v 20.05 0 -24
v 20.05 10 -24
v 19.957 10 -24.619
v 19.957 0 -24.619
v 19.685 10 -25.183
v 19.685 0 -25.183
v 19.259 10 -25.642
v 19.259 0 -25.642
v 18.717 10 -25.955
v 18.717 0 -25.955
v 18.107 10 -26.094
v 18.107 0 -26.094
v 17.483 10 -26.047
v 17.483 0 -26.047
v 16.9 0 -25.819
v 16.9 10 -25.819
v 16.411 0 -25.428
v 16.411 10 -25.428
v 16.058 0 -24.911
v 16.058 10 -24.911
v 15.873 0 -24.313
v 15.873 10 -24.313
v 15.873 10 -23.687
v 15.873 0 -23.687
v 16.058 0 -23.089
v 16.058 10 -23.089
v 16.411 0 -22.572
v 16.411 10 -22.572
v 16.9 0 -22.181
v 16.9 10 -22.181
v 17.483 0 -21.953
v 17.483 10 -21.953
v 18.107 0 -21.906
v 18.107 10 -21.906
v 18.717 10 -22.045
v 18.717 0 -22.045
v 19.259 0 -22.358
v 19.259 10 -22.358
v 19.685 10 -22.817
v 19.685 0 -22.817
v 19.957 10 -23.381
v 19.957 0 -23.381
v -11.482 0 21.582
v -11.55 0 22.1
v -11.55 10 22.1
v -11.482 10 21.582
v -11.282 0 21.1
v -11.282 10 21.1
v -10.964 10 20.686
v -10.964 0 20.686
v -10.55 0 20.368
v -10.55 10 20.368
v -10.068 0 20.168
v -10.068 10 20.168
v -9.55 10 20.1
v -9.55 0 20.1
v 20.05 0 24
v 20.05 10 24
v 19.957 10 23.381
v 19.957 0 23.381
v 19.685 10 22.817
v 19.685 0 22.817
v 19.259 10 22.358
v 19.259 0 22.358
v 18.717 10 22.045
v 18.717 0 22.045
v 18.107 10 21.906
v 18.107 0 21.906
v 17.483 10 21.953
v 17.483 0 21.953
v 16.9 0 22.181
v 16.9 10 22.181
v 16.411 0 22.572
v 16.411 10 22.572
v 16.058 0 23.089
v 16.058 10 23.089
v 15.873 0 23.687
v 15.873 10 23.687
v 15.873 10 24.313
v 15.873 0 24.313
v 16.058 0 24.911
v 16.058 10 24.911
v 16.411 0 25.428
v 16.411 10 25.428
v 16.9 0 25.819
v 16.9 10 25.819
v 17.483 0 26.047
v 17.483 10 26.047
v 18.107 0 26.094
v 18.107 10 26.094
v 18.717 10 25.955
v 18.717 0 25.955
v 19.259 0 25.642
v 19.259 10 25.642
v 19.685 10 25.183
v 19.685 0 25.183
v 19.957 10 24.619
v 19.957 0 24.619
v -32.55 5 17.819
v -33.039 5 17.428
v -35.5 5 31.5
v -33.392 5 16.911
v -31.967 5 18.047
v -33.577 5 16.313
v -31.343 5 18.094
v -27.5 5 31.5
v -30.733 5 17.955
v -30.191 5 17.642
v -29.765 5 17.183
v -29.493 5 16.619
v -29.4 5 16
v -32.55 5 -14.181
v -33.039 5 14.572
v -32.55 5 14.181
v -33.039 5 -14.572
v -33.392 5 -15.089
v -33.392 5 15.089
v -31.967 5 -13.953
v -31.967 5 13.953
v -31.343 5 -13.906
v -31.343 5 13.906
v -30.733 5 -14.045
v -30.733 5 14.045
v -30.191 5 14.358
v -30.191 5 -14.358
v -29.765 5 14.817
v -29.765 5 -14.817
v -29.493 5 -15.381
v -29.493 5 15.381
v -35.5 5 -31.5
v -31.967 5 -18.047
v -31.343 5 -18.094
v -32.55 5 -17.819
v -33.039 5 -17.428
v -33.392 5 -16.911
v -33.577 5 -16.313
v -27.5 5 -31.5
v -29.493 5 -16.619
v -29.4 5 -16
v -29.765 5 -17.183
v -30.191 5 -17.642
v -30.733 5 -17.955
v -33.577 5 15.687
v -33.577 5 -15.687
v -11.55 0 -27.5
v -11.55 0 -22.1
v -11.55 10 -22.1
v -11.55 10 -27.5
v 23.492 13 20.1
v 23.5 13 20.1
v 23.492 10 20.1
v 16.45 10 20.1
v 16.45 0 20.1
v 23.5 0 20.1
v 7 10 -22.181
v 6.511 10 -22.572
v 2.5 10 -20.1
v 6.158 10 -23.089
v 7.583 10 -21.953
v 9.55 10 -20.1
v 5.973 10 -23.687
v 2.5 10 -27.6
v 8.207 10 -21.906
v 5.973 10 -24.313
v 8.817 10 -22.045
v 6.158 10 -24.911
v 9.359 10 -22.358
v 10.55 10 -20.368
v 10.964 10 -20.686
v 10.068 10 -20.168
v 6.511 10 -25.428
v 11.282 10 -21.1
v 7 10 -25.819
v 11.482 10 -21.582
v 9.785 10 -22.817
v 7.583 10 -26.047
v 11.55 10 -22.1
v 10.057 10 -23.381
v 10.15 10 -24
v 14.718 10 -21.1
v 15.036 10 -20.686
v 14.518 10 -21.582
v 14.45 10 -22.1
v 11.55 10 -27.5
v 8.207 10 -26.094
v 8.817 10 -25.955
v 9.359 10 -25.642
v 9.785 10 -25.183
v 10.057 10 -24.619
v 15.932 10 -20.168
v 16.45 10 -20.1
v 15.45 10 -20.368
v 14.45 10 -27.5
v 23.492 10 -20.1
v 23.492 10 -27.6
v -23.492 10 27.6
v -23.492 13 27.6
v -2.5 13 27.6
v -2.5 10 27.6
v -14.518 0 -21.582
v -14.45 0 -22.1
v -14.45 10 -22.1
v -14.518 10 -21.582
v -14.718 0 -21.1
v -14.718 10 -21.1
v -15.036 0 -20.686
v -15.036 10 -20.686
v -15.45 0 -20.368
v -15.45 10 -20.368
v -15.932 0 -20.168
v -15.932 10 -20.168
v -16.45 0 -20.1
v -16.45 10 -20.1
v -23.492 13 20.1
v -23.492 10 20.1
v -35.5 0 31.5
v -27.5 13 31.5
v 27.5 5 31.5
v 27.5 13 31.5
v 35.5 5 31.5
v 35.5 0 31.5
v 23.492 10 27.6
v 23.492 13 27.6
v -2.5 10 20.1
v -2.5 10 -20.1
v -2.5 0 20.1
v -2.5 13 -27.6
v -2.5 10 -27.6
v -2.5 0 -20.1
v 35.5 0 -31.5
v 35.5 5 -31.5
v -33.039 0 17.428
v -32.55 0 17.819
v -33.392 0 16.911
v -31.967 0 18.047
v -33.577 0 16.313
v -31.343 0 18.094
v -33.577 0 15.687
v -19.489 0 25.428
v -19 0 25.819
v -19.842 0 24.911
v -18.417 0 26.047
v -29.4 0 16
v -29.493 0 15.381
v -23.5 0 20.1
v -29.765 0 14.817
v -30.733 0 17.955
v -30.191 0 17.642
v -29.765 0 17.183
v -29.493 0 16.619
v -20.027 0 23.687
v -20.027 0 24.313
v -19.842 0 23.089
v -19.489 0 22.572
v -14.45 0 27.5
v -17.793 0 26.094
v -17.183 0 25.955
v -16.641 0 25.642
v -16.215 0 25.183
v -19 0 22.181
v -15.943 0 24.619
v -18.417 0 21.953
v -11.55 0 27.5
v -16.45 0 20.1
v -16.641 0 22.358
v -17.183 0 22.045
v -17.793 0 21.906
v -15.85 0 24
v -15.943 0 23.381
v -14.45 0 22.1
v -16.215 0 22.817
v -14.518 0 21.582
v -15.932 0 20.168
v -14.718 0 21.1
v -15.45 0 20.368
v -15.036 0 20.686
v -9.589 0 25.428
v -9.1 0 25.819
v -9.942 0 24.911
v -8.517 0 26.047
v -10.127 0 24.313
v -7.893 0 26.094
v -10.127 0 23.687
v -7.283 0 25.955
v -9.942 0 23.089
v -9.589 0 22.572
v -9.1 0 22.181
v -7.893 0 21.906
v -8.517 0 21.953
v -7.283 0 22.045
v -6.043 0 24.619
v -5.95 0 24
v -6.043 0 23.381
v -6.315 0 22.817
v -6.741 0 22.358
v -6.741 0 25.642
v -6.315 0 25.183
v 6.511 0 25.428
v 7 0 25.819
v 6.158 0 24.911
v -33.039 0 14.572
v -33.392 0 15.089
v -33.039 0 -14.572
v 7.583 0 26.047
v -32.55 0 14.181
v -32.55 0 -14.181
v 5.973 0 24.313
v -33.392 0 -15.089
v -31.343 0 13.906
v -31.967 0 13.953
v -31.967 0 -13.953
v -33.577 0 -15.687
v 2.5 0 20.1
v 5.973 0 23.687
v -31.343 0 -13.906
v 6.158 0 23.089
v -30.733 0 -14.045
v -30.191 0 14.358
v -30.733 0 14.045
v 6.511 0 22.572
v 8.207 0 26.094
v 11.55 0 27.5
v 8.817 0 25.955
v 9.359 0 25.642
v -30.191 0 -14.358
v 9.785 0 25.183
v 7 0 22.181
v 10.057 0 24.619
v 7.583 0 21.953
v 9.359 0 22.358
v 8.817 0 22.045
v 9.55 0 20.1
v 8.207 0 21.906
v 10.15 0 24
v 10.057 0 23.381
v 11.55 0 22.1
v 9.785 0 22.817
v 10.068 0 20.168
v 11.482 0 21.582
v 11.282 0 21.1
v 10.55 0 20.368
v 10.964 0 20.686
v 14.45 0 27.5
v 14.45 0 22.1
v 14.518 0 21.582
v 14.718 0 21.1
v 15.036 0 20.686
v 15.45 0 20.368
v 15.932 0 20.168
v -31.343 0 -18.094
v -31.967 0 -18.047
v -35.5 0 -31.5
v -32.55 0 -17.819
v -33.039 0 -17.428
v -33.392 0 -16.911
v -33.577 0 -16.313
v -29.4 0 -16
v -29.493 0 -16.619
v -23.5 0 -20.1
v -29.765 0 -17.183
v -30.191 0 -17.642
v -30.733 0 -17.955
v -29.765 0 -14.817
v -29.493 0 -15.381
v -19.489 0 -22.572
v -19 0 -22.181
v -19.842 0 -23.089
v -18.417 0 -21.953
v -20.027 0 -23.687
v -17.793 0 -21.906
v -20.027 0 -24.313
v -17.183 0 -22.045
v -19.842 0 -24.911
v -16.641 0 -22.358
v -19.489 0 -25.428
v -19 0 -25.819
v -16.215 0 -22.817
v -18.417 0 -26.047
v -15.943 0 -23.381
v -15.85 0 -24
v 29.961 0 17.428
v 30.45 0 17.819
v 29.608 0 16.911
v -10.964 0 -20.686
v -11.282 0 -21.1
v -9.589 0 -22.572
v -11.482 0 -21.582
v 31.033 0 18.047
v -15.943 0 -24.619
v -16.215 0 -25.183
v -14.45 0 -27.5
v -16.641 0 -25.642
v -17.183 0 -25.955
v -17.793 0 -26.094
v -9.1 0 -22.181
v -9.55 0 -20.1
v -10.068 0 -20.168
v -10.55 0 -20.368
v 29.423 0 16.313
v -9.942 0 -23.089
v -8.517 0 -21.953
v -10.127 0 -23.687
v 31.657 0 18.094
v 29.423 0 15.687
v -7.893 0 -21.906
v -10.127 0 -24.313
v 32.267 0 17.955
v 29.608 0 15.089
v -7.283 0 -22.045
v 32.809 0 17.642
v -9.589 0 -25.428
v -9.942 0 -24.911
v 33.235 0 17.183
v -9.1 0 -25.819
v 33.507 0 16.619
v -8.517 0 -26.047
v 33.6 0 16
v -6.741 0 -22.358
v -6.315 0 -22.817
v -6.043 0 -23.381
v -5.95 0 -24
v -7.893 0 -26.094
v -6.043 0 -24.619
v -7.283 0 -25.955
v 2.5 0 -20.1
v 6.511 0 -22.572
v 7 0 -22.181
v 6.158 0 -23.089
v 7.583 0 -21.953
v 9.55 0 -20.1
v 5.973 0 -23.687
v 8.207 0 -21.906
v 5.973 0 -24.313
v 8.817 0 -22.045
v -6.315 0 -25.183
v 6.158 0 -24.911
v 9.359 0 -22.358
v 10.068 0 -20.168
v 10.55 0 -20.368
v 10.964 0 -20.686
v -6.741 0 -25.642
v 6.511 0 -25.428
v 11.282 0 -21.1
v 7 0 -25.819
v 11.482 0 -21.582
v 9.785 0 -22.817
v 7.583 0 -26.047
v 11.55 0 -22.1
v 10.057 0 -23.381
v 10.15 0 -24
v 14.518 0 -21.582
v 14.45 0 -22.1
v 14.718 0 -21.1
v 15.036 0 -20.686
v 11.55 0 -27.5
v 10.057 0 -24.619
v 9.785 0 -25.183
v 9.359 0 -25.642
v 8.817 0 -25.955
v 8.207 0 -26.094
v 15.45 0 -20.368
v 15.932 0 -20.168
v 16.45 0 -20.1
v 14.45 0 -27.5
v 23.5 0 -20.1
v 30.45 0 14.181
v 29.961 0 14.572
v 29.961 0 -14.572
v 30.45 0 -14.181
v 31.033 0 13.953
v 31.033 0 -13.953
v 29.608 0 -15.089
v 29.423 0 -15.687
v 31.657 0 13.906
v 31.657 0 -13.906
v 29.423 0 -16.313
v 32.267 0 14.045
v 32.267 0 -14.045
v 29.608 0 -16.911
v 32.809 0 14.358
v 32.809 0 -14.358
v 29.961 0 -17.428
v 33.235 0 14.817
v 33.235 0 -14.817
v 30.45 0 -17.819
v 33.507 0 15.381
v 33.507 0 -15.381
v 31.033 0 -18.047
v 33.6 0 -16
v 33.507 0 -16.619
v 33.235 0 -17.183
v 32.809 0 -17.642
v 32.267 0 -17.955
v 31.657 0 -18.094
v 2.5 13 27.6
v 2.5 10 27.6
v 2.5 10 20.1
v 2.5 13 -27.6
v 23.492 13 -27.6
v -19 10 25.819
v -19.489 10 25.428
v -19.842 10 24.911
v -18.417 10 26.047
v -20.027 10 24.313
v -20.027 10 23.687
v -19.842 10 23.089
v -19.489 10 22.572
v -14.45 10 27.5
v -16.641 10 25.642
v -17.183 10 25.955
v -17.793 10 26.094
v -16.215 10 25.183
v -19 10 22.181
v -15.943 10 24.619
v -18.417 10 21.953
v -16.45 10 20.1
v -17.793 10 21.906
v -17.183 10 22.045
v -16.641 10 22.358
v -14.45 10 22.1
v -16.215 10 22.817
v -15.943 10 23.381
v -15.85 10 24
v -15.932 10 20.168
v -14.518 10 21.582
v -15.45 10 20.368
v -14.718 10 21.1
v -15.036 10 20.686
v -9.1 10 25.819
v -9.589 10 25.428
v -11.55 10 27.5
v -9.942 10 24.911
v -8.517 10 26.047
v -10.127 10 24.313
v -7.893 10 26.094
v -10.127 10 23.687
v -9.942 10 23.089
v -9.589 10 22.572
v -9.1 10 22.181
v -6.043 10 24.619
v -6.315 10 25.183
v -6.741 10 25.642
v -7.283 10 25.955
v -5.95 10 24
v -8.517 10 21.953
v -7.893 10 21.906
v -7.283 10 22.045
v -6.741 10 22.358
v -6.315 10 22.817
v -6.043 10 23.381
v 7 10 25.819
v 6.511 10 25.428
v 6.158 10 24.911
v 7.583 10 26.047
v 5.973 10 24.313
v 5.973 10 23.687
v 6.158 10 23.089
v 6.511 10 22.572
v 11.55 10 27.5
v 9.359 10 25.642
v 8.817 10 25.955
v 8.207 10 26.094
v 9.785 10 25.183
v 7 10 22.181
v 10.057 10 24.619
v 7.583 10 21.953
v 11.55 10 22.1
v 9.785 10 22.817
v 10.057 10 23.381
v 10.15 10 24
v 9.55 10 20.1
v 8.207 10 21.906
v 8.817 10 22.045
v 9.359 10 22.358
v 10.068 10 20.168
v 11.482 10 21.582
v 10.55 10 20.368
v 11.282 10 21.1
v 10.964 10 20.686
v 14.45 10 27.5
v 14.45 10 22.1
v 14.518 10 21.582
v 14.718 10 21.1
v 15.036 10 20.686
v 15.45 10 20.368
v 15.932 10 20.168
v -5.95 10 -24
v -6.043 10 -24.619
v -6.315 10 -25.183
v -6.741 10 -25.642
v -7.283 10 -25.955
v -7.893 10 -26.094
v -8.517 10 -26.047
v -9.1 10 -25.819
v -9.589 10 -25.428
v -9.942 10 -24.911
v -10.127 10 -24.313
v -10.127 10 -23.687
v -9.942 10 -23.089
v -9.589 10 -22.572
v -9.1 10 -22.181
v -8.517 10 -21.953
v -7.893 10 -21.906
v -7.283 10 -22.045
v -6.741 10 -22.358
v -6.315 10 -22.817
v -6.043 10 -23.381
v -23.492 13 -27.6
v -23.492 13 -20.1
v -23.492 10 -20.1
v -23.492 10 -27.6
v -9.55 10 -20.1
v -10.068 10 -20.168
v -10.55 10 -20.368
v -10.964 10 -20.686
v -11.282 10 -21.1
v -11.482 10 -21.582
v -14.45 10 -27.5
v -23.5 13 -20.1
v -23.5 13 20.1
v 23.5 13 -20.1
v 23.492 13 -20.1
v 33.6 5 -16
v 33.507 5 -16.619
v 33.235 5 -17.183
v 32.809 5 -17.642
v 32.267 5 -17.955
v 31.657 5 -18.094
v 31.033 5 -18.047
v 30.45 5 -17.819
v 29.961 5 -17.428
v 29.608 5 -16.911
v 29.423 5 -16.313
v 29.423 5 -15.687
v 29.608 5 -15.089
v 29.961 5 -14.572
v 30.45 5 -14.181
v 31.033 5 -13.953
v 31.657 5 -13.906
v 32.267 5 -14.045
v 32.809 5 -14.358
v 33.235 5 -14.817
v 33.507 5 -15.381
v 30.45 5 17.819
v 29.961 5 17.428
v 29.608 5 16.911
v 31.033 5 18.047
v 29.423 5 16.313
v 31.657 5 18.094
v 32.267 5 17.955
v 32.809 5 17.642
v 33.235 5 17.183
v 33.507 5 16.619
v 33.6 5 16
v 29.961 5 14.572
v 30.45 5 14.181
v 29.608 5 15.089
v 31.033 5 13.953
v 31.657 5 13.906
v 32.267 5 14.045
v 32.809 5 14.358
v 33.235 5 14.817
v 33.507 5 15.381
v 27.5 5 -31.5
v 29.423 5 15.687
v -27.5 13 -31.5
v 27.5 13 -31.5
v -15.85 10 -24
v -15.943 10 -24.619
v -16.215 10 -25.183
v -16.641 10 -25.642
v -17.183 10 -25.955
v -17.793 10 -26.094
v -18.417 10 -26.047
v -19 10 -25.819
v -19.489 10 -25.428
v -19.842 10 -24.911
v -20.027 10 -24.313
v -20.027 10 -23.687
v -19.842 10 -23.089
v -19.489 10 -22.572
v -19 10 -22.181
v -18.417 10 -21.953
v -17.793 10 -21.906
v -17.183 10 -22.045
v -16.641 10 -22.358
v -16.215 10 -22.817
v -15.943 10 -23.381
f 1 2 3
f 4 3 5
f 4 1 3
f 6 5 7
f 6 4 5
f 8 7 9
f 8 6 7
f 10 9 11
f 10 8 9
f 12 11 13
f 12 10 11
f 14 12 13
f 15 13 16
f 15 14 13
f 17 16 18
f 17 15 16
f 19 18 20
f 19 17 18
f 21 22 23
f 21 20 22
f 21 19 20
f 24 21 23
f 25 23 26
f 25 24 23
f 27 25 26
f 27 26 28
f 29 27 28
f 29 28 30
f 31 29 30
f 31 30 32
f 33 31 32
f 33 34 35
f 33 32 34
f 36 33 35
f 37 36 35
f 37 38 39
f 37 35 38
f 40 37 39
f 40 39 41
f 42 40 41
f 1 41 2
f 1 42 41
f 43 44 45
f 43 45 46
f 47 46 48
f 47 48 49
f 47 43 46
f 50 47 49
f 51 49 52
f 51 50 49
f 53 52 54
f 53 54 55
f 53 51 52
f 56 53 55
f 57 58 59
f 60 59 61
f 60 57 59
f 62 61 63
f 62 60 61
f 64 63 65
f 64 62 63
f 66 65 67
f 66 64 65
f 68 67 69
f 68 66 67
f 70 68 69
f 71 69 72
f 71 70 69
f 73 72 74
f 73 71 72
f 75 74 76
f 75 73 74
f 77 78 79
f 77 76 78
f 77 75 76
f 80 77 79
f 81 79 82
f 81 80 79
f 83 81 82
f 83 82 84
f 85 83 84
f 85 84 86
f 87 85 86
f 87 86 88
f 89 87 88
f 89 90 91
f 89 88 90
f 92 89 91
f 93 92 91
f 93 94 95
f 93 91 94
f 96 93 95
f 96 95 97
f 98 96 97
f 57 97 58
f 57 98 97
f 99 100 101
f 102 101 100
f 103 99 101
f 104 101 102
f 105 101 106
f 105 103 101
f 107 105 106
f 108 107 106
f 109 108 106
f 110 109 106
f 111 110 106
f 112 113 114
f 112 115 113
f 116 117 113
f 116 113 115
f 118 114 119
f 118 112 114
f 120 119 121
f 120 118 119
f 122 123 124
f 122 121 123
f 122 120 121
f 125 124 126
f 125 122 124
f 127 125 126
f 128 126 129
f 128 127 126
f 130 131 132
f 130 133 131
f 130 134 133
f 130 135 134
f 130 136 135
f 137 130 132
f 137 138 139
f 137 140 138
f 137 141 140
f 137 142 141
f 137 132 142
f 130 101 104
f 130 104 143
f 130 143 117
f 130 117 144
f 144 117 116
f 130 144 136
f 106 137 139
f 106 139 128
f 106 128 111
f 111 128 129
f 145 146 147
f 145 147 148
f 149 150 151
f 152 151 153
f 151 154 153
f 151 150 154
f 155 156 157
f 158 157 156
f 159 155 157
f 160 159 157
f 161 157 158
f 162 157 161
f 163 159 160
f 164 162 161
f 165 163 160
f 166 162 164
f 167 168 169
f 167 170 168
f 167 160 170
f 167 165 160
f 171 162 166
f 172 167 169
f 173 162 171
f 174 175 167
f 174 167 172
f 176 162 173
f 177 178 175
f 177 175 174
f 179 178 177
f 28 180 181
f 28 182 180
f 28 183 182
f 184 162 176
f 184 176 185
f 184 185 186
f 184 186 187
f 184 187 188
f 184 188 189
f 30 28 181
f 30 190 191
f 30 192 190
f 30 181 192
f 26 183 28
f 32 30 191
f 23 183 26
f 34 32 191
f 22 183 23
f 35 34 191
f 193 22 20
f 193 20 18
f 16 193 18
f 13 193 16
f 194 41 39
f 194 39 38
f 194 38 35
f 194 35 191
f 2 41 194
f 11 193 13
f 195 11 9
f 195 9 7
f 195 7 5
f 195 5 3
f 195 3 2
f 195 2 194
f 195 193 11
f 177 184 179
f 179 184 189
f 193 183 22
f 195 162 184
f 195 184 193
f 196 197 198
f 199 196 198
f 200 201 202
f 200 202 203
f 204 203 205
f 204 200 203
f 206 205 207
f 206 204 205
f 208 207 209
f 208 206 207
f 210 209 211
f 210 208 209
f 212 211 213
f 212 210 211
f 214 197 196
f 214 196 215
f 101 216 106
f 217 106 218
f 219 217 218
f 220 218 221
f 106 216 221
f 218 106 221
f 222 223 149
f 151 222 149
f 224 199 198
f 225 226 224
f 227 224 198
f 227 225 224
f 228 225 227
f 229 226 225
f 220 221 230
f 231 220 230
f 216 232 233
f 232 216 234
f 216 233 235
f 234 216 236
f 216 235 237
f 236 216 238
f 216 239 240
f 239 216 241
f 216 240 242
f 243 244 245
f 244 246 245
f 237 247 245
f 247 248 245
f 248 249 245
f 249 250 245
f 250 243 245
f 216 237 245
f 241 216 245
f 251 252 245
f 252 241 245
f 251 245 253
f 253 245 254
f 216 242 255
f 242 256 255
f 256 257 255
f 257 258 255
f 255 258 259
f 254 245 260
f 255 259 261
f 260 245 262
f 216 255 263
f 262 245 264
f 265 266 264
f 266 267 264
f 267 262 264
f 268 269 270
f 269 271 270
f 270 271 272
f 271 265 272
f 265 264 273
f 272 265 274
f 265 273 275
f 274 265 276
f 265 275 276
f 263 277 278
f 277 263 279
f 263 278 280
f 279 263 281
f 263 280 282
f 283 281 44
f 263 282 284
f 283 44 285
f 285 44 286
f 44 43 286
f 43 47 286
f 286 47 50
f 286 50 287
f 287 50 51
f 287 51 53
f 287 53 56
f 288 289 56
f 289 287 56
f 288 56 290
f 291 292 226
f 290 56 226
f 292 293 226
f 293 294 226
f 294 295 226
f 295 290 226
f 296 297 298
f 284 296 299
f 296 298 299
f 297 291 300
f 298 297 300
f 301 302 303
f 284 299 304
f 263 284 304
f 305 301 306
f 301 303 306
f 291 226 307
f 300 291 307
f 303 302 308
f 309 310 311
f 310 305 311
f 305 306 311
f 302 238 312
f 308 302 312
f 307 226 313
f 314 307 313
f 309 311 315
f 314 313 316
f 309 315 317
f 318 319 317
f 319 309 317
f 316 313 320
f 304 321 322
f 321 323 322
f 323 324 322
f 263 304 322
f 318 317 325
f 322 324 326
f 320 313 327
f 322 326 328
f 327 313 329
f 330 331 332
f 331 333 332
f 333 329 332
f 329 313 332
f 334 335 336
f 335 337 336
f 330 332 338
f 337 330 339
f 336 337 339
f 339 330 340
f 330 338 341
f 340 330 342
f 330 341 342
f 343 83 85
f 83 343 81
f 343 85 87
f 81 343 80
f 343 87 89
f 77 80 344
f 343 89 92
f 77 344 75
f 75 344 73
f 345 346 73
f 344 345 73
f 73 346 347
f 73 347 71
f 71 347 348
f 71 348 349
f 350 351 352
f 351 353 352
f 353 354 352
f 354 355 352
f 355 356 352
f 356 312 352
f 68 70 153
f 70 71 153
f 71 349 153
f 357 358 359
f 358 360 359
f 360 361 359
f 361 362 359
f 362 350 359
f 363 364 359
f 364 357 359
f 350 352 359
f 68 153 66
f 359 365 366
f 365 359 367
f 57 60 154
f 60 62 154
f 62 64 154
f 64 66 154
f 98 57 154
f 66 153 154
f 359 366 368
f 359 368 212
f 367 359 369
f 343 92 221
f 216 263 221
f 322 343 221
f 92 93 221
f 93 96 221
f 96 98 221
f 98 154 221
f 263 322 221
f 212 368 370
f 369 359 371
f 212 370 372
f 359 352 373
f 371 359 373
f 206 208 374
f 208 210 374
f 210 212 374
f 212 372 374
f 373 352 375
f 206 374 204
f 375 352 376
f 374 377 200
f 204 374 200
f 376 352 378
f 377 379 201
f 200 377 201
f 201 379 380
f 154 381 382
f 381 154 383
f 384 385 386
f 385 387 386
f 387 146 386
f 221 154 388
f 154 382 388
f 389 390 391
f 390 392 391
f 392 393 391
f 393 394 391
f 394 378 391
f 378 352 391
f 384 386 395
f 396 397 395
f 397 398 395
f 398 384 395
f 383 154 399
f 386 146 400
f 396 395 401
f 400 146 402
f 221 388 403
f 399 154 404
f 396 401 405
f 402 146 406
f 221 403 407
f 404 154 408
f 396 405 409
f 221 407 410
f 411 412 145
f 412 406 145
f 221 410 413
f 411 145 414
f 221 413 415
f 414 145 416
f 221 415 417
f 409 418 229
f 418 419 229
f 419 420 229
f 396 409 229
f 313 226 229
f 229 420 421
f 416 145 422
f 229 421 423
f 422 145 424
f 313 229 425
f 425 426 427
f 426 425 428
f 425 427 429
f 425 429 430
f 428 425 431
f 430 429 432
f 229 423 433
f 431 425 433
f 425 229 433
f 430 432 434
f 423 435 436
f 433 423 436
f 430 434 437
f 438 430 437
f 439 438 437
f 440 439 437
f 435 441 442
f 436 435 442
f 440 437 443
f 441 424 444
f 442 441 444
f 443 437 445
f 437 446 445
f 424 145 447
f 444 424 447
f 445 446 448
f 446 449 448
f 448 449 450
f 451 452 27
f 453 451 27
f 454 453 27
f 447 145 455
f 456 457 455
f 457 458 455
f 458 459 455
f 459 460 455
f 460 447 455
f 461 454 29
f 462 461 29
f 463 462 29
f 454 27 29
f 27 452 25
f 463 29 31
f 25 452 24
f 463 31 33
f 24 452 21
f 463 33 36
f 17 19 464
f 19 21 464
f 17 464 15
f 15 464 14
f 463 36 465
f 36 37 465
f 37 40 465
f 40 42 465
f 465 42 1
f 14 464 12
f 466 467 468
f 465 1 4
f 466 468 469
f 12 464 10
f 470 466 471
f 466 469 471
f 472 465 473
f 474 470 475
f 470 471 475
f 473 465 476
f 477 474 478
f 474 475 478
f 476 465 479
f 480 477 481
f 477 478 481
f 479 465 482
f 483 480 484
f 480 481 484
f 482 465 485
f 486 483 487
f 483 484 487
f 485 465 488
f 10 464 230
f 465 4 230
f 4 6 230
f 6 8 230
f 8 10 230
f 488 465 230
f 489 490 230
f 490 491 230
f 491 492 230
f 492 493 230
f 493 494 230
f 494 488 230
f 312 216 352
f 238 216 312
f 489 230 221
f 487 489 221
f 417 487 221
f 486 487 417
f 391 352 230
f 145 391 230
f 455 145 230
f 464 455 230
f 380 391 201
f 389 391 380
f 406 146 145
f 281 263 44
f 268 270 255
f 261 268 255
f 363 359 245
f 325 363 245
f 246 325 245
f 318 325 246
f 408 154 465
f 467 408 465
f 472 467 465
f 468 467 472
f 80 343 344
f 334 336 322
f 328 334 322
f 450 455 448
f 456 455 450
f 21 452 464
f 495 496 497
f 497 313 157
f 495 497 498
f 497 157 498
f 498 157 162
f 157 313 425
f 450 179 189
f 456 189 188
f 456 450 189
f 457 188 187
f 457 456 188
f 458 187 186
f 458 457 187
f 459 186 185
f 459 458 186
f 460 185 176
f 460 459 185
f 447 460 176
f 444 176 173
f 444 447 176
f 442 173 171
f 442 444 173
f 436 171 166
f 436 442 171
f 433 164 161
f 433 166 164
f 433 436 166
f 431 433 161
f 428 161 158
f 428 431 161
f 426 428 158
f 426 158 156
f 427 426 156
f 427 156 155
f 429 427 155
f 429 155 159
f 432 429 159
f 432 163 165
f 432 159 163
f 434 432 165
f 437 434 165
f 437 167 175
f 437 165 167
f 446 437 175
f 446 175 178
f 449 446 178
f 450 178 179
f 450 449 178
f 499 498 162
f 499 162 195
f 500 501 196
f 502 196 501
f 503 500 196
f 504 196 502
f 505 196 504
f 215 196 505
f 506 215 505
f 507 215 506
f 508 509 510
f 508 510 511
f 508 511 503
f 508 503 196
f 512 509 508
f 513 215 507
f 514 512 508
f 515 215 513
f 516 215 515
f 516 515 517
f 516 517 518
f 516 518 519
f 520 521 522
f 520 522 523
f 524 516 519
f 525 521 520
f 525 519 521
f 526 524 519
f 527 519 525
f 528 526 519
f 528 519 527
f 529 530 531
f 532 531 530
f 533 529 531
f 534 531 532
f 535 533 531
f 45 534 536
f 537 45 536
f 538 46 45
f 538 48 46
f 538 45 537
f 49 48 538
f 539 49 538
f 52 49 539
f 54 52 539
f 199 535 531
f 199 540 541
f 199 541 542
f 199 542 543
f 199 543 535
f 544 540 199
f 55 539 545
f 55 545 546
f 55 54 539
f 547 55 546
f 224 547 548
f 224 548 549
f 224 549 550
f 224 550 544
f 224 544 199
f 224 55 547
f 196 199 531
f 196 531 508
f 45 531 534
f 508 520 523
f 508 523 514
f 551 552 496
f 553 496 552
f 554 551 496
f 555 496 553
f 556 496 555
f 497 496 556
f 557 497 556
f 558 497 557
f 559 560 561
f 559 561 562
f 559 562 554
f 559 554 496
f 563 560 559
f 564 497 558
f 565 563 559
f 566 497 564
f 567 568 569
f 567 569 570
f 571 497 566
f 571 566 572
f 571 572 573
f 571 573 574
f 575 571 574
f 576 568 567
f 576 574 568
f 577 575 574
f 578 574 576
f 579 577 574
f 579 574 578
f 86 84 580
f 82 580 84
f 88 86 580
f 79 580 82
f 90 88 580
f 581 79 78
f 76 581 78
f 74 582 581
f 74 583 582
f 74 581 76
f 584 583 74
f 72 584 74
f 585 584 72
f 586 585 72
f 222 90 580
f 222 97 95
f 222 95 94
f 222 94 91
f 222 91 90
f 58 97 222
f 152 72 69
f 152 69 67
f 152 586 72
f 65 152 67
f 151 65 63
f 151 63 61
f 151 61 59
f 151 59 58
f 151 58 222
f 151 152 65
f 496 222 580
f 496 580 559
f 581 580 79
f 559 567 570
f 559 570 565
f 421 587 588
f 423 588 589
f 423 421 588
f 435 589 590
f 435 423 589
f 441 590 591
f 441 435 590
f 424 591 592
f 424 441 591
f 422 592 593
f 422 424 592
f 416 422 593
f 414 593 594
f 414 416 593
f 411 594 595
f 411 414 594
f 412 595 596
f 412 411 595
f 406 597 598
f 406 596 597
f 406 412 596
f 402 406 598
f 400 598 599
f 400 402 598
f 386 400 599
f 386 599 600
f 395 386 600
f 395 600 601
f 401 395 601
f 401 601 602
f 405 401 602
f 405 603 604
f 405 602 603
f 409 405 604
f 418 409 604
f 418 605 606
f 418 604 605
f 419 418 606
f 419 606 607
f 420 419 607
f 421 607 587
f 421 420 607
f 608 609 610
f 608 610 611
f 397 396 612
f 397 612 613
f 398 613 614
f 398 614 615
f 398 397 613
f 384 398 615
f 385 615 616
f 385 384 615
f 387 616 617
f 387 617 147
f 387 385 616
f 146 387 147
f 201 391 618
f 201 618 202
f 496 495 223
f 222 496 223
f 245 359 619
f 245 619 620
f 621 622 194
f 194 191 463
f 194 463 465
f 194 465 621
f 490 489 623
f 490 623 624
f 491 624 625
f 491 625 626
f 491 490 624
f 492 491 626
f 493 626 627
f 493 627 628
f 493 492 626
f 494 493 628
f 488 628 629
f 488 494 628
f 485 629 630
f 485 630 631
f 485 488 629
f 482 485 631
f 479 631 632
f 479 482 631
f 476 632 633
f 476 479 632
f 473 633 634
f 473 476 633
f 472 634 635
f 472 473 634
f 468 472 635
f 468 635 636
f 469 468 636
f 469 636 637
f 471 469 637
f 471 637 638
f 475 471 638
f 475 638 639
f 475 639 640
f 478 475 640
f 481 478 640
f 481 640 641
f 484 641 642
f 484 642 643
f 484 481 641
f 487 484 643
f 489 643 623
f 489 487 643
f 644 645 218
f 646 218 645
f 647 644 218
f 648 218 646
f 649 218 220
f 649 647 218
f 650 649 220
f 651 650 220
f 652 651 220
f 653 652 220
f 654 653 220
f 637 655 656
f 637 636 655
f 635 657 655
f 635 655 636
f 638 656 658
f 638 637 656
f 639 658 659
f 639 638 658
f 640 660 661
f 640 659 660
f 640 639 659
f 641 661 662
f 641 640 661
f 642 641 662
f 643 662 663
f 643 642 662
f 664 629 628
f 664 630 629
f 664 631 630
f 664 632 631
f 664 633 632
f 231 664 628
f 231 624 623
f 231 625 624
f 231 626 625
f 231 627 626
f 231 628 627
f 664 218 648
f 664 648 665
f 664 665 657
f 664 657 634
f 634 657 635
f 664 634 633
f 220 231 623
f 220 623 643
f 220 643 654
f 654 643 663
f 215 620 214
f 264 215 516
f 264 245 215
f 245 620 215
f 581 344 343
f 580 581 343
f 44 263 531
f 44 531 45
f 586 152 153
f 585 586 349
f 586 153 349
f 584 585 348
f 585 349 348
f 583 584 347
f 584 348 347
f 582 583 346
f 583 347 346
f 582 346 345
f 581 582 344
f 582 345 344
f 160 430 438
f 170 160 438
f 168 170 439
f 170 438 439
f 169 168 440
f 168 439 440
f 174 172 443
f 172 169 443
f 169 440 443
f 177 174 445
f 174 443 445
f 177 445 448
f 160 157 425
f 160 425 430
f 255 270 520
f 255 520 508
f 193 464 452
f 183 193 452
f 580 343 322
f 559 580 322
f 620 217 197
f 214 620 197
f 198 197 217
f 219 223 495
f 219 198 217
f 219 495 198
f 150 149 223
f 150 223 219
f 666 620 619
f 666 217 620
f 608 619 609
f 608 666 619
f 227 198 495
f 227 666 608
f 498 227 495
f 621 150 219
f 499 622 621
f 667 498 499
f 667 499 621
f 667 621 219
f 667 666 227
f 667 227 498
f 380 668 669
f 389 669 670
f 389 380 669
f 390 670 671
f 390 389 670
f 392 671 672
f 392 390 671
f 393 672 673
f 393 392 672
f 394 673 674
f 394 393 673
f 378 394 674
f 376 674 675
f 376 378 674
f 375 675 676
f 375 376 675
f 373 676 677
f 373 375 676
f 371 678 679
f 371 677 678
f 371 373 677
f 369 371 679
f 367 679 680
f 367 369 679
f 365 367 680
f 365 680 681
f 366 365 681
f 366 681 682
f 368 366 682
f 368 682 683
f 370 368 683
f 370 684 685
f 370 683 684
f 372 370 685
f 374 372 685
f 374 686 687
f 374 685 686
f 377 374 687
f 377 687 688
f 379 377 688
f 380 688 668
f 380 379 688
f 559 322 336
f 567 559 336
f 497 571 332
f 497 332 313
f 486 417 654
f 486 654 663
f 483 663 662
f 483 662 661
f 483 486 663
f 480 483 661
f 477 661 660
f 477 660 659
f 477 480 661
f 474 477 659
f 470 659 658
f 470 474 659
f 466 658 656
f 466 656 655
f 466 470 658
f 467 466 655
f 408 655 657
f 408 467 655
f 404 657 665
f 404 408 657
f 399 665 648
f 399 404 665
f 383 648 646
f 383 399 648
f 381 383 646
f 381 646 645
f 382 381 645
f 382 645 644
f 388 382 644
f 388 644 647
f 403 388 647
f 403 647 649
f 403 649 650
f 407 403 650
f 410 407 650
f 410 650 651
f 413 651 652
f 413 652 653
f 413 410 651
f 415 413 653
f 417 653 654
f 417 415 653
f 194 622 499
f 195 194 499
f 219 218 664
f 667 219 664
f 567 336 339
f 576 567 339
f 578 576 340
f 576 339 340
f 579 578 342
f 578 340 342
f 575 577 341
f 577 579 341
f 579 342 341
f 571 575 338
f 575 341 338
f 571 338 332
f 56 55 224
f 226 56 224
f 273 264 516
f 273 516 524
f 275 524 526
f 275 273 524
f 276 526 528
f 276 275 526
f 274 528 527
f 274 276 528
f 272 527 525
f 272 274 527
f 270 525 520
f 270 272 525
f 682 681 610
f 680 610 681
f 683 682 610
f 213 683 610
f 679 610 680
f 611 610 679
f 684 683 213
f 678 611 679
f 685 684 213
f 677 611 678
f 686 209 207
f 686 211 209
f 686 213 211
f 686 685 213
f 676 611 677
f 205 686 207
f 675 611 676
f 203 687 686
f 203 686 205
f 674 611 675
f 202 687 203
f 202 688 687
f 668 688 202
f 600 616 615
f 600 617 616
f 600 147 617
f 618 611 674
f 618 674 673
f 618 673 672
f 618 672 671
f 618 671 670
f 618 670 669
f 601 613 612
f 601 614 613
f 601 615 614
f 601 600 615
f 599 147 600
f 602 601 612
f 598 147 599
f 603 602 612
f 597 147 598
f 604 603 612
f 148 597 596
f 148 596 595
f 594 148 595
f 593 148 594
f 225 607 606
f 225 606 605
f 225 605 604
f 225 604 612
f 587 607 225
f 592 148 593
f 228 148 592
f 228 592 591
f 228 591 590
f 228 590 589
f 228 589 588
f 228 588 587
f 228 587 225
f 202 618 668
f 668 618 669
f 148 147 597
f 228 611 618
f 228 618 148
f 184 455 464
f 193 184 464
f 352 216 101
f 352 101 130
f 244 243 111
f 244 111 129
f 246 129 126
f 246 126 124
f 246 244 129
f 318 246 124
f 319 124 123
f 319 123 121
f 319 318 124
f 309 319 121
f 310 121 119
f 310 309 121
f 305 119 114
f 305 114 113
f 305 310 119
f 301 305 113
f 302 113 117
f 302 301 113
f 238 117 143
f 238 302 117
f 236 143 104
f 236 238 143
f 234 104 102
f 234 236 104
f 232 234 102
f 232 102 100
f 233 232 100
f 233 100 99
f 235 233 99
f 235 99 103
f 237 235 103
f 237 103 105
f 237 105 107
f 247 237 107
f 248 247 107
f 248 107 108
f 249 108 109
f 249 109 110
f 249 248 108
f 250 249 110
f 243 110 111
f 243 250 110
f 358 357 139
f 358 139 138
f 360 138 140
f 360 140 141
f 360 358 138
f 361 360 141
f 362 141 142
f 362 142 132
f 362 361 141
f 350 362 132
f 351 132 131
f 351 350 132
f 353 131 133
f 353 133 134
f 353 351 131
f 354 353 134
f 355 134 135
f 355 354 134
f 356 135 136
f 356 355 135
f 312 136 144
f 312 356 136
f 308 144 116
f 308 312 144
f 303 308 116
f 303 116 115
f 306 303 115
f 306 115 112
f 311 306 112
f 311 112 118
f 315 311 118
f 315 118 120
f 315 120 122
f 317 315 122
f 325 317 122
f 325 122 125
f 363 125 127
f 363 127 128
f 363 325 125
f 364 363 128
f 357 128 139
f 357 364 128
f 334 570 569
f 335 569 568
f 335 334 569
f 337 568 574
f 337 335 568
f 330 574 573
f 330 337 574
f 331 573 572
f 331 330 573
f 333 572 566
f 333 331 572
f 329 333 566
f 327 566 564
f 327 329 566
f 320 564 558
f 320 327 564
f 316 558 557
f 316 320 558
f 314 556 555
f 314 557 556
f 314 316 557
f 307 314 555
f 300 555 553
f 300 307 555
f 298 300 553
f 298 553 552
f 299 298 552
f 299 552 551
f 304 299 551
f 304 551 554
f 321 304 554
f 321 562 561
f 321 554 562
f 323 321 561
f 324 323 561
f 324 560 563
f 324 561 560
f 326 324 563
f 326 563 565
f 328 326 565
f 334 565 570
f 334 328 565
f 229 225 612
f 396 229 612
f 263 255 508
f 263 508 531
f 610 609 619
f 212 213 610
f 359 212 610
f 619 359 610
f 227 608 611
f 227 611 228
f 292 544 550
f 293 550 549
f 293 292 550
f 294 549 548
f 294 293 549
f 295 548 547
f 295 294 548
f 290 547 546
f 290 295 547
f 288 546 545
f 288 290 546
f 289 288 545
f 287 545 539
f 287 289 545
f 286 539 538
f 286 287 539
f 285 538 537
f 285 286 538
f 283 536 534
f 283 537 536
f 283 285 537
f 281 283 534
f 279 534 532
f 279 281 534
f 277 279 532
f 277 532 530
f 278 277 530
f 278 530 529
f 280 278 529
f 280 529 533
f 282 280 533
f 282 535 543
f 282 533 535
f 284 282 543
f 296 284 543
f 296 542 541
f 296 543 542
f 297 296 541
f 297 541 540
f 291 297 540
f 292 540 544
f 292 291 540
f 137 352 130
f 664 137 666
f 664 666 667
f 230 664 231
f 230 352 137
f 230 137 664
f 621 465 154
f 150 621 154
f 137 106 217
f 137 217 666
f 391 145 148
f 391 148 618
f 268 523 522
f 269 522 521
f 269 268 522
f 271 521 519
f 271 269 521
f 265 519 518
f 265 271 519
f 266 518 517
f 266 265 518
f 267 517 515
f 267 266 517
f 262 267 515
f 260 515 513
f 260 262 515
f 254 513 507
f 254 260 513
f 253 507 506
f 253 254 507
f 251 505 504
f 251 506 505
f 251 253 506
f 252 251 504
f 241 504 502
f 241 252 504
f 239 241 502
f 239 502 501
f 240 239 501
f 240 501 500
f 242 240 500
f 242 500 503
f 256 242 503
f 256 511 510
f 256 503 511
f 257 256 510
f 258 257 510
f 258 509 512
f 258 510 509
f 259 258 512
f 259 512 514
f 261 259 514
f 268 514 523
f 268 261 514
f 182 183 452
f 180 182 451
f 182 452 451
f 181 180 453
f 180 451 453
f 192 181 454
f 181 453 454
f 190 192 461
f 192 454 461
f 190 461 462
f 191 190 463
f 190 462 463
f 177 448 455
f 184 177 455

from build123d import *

# Parameters (mm, degrees)
SKETCH2_W           = 55
SKETCH2_H           = 63
SKETCH2_R           = 2.1
BOSS_EXTRUDE1_DEPTH = 13
SKETCH3_W           = 20.991665644
SKETCH3_H           = 7.5
CUT_EXTRUDE1_DEPTH  = 3
SKETCH2_3_W         = 8
SKETCH2_3_H         = 63
SKETCH2_3_R         = 2.1
BOSS_EXTRUDE2_DEPTH = 5


with BuildPart() as part:
    # Sketch2 → Boss-Extrude1 (new body)
    with BuildSketch(Plane(origin=(0, 0, 0), x_dir=(1, 0, 0), z_dir=(0, 1, 0))):
        Rectangle(SKETCH2_W, SKETCH2_H)
        with Locations((-17.95, -24)):
            Circle(SKETCH2_R, mode=Mode.SUBTRACT)
        with Locations((-8.05, -24)):
            Circle(SKETCH2_R, mode=Mode.SUBTRACT)
        with Locations((8.05, -24)):
            Circle(SKETCH2_R, mode=Mode.SUBTRACT)
        with Locations((17.95, -24)):
            Circle(SKETCH2_R, mode=Mode.SUBTRACT)
        with BuildLine():
            Line((14.45, -27.5), (11.55, -27.5))
            Line((11.55, -27.5), (11.55, -22.1))
            ThreePointArc((11.55, -22.1), (10.964213562, -20.685786438), (9.55, -20.1))
            Line((9.55, -20.1), (2.5, -20.1))
            Line((2.5, -20.1), (2.5, 20.1))
            Line((2.5, 20.1), (9.55, 20.1))
            ThreePointArc((9.55, 20.1), (10.964213562, 20.685786438), (11.55, 22.1))
            Line((11.55, 22.1), (11.55, 27.5))
            Line((11.55, 27.5), (14.45, 27.5))
            Line((14.45, 27.5), (14.45, 22.1))
            ThreePointArc((14.45, 22.1), (15.035786438, 20.685786438), (16.45, 20.1))
            Line((16.45, 20.1), (23.5, 20.1))
            Line((23.5, 20.1), (23.5, -20.1))
            Line((23.5, -20.1), (16.45, -20.1))
            ThreePointArc((16.45, -20.1), (15.035786438, -20.685786438), (14.45, -22.1))
            Line((14.45, -22.1), (14.45, -27.5))
        make_face(mode=Mode.SUBTRACT)
        with BuildLine():
            Line((-23.5, 20.1), (-16.45, 20.1))
            ThreePointArc((-16.45, 20.1), (-15.035786438, 20.685786438), (-14.45, 22.1))
            Line((-14.45, 22.1), (-14.45, 27.5))
            Line((-14.45, 27.5), (-11.55, 27.5))
            Line((-11.55, 27.5), (-11.55, 22.1))
            ThreePointArc((-11.55, 22.1), (-10.964213562, 20.685786438), (-9.55, 20.1))
            Line((-9.55, 20.1), (-2.5, 20.1))
            Line((-2.5, 20.1), (-2.5, -20.1))
            Line((-2.5, -20.1), (-9.55, -20.1))
            ThreePointArc((-9.55, -20.1), (-10.964213562, -20.685786438), (-11.55, -22.1))
            Line((-11.55, -22.1), (-11.55, -27.5))
            Line((-11.55, -27.5), (-14.45, -27.5))
            Line((-14.45, -27.5), (-14.45, -22.1))
            ThreePointArc((-14.45, -22.1), (-15.035786438, -20.685786438), (-16.45, -20.1))
            Line((-16.45, -20.1), (-23.5, -20.1))
            Line((-23.5, -20.1), (-23.5, 20.1))
        make_face(mode=Mode.SUBTRACT)
        with Locations((-17.95, 24)):
            Circle(SKETCH2_R, mode=Mode.SUBTRACT)
        with Locations((-8.05, 24)):
            Circle(SKETCH2_R, mode=Mode.SUBTRACT)
        with Locations((8.05, 24)):
            Circle(SKETCH2_R, mode=Mode.SUBTRACT)
        with Locations((17.95, 24)):
            Circle(SKETCH2_R, mode=Mode.SUBTRACT)
    extrude(amount=BOSS_EXTRUDE1_DEPTH)

    # Sketch3 → Cut-Extrude1 (cut)
    with BuildSketch(Plane(origin=(0, 13, 0), x_dir=(1, 0, 0), z_dir=(0, 1, 0))):
        with Locations((12.995832822, 23.85)):
            Rectangle(SKETCH3_W, SKETCH3_H)
        with Locations((12.995832822, -23.85)):
            Rectangle(SKETCH3_W, SKETCH3_H)
        with Locations((-12.995832822, -23.85)):
            Rectangle(SKETCH3_W, SKETCH3_H)
        with Locations((-12.995832822, 23.85)):
            Rectangle(SKETCH3_W, SKETCH3_H)
    extrude(amount=-CUT_EXTRUDE1_DEPTH, mode=Mode.SUBTRACT)

    # Sketch2<3> → Boss-Extrude2 (add)
    # profile 1 of 2: a face of its own
    with BuildSketch(Plane(origin=(0, 0, 0), x_dir=(1, 0, 0), z_dir=(0, 1, 0))):
        with Locations((-31.5, 0)):
            Rectangle(SKETCH2_3_W, SKETCH2_3_H)
        with Locations((-31.5, -16)):
            Circle(SKETCH2_3_R, mode=Mode.SUBTRACT)
        with Locations((-31.5, 16)):
            Circle(SKETCH2_3_R, mode=Mode.SUBTRACT)
    # profile 2 of 2: a face of its own
    with BuildSketch(Plane(origin=(0, 0, 0), x_dir=(1, 0, 0), z_dir=(0, 1, 0))):
        with Locations((31.5, 0)):
            Rectangle(SKETCH2_3_W, SKETCH2_3_H)
        with Locations((31.5, -16)):
            Circle(SKETCH2_3_R, mode=Mode.SUBTRACT)
        with Locations((31.5, 16)):
            Circle(SKETCH2_3_R, mode=Mode.SUBTRACT)
    extrude(amount=BOSS_EXTRUDE2_DEPTH)


solid = part.part
